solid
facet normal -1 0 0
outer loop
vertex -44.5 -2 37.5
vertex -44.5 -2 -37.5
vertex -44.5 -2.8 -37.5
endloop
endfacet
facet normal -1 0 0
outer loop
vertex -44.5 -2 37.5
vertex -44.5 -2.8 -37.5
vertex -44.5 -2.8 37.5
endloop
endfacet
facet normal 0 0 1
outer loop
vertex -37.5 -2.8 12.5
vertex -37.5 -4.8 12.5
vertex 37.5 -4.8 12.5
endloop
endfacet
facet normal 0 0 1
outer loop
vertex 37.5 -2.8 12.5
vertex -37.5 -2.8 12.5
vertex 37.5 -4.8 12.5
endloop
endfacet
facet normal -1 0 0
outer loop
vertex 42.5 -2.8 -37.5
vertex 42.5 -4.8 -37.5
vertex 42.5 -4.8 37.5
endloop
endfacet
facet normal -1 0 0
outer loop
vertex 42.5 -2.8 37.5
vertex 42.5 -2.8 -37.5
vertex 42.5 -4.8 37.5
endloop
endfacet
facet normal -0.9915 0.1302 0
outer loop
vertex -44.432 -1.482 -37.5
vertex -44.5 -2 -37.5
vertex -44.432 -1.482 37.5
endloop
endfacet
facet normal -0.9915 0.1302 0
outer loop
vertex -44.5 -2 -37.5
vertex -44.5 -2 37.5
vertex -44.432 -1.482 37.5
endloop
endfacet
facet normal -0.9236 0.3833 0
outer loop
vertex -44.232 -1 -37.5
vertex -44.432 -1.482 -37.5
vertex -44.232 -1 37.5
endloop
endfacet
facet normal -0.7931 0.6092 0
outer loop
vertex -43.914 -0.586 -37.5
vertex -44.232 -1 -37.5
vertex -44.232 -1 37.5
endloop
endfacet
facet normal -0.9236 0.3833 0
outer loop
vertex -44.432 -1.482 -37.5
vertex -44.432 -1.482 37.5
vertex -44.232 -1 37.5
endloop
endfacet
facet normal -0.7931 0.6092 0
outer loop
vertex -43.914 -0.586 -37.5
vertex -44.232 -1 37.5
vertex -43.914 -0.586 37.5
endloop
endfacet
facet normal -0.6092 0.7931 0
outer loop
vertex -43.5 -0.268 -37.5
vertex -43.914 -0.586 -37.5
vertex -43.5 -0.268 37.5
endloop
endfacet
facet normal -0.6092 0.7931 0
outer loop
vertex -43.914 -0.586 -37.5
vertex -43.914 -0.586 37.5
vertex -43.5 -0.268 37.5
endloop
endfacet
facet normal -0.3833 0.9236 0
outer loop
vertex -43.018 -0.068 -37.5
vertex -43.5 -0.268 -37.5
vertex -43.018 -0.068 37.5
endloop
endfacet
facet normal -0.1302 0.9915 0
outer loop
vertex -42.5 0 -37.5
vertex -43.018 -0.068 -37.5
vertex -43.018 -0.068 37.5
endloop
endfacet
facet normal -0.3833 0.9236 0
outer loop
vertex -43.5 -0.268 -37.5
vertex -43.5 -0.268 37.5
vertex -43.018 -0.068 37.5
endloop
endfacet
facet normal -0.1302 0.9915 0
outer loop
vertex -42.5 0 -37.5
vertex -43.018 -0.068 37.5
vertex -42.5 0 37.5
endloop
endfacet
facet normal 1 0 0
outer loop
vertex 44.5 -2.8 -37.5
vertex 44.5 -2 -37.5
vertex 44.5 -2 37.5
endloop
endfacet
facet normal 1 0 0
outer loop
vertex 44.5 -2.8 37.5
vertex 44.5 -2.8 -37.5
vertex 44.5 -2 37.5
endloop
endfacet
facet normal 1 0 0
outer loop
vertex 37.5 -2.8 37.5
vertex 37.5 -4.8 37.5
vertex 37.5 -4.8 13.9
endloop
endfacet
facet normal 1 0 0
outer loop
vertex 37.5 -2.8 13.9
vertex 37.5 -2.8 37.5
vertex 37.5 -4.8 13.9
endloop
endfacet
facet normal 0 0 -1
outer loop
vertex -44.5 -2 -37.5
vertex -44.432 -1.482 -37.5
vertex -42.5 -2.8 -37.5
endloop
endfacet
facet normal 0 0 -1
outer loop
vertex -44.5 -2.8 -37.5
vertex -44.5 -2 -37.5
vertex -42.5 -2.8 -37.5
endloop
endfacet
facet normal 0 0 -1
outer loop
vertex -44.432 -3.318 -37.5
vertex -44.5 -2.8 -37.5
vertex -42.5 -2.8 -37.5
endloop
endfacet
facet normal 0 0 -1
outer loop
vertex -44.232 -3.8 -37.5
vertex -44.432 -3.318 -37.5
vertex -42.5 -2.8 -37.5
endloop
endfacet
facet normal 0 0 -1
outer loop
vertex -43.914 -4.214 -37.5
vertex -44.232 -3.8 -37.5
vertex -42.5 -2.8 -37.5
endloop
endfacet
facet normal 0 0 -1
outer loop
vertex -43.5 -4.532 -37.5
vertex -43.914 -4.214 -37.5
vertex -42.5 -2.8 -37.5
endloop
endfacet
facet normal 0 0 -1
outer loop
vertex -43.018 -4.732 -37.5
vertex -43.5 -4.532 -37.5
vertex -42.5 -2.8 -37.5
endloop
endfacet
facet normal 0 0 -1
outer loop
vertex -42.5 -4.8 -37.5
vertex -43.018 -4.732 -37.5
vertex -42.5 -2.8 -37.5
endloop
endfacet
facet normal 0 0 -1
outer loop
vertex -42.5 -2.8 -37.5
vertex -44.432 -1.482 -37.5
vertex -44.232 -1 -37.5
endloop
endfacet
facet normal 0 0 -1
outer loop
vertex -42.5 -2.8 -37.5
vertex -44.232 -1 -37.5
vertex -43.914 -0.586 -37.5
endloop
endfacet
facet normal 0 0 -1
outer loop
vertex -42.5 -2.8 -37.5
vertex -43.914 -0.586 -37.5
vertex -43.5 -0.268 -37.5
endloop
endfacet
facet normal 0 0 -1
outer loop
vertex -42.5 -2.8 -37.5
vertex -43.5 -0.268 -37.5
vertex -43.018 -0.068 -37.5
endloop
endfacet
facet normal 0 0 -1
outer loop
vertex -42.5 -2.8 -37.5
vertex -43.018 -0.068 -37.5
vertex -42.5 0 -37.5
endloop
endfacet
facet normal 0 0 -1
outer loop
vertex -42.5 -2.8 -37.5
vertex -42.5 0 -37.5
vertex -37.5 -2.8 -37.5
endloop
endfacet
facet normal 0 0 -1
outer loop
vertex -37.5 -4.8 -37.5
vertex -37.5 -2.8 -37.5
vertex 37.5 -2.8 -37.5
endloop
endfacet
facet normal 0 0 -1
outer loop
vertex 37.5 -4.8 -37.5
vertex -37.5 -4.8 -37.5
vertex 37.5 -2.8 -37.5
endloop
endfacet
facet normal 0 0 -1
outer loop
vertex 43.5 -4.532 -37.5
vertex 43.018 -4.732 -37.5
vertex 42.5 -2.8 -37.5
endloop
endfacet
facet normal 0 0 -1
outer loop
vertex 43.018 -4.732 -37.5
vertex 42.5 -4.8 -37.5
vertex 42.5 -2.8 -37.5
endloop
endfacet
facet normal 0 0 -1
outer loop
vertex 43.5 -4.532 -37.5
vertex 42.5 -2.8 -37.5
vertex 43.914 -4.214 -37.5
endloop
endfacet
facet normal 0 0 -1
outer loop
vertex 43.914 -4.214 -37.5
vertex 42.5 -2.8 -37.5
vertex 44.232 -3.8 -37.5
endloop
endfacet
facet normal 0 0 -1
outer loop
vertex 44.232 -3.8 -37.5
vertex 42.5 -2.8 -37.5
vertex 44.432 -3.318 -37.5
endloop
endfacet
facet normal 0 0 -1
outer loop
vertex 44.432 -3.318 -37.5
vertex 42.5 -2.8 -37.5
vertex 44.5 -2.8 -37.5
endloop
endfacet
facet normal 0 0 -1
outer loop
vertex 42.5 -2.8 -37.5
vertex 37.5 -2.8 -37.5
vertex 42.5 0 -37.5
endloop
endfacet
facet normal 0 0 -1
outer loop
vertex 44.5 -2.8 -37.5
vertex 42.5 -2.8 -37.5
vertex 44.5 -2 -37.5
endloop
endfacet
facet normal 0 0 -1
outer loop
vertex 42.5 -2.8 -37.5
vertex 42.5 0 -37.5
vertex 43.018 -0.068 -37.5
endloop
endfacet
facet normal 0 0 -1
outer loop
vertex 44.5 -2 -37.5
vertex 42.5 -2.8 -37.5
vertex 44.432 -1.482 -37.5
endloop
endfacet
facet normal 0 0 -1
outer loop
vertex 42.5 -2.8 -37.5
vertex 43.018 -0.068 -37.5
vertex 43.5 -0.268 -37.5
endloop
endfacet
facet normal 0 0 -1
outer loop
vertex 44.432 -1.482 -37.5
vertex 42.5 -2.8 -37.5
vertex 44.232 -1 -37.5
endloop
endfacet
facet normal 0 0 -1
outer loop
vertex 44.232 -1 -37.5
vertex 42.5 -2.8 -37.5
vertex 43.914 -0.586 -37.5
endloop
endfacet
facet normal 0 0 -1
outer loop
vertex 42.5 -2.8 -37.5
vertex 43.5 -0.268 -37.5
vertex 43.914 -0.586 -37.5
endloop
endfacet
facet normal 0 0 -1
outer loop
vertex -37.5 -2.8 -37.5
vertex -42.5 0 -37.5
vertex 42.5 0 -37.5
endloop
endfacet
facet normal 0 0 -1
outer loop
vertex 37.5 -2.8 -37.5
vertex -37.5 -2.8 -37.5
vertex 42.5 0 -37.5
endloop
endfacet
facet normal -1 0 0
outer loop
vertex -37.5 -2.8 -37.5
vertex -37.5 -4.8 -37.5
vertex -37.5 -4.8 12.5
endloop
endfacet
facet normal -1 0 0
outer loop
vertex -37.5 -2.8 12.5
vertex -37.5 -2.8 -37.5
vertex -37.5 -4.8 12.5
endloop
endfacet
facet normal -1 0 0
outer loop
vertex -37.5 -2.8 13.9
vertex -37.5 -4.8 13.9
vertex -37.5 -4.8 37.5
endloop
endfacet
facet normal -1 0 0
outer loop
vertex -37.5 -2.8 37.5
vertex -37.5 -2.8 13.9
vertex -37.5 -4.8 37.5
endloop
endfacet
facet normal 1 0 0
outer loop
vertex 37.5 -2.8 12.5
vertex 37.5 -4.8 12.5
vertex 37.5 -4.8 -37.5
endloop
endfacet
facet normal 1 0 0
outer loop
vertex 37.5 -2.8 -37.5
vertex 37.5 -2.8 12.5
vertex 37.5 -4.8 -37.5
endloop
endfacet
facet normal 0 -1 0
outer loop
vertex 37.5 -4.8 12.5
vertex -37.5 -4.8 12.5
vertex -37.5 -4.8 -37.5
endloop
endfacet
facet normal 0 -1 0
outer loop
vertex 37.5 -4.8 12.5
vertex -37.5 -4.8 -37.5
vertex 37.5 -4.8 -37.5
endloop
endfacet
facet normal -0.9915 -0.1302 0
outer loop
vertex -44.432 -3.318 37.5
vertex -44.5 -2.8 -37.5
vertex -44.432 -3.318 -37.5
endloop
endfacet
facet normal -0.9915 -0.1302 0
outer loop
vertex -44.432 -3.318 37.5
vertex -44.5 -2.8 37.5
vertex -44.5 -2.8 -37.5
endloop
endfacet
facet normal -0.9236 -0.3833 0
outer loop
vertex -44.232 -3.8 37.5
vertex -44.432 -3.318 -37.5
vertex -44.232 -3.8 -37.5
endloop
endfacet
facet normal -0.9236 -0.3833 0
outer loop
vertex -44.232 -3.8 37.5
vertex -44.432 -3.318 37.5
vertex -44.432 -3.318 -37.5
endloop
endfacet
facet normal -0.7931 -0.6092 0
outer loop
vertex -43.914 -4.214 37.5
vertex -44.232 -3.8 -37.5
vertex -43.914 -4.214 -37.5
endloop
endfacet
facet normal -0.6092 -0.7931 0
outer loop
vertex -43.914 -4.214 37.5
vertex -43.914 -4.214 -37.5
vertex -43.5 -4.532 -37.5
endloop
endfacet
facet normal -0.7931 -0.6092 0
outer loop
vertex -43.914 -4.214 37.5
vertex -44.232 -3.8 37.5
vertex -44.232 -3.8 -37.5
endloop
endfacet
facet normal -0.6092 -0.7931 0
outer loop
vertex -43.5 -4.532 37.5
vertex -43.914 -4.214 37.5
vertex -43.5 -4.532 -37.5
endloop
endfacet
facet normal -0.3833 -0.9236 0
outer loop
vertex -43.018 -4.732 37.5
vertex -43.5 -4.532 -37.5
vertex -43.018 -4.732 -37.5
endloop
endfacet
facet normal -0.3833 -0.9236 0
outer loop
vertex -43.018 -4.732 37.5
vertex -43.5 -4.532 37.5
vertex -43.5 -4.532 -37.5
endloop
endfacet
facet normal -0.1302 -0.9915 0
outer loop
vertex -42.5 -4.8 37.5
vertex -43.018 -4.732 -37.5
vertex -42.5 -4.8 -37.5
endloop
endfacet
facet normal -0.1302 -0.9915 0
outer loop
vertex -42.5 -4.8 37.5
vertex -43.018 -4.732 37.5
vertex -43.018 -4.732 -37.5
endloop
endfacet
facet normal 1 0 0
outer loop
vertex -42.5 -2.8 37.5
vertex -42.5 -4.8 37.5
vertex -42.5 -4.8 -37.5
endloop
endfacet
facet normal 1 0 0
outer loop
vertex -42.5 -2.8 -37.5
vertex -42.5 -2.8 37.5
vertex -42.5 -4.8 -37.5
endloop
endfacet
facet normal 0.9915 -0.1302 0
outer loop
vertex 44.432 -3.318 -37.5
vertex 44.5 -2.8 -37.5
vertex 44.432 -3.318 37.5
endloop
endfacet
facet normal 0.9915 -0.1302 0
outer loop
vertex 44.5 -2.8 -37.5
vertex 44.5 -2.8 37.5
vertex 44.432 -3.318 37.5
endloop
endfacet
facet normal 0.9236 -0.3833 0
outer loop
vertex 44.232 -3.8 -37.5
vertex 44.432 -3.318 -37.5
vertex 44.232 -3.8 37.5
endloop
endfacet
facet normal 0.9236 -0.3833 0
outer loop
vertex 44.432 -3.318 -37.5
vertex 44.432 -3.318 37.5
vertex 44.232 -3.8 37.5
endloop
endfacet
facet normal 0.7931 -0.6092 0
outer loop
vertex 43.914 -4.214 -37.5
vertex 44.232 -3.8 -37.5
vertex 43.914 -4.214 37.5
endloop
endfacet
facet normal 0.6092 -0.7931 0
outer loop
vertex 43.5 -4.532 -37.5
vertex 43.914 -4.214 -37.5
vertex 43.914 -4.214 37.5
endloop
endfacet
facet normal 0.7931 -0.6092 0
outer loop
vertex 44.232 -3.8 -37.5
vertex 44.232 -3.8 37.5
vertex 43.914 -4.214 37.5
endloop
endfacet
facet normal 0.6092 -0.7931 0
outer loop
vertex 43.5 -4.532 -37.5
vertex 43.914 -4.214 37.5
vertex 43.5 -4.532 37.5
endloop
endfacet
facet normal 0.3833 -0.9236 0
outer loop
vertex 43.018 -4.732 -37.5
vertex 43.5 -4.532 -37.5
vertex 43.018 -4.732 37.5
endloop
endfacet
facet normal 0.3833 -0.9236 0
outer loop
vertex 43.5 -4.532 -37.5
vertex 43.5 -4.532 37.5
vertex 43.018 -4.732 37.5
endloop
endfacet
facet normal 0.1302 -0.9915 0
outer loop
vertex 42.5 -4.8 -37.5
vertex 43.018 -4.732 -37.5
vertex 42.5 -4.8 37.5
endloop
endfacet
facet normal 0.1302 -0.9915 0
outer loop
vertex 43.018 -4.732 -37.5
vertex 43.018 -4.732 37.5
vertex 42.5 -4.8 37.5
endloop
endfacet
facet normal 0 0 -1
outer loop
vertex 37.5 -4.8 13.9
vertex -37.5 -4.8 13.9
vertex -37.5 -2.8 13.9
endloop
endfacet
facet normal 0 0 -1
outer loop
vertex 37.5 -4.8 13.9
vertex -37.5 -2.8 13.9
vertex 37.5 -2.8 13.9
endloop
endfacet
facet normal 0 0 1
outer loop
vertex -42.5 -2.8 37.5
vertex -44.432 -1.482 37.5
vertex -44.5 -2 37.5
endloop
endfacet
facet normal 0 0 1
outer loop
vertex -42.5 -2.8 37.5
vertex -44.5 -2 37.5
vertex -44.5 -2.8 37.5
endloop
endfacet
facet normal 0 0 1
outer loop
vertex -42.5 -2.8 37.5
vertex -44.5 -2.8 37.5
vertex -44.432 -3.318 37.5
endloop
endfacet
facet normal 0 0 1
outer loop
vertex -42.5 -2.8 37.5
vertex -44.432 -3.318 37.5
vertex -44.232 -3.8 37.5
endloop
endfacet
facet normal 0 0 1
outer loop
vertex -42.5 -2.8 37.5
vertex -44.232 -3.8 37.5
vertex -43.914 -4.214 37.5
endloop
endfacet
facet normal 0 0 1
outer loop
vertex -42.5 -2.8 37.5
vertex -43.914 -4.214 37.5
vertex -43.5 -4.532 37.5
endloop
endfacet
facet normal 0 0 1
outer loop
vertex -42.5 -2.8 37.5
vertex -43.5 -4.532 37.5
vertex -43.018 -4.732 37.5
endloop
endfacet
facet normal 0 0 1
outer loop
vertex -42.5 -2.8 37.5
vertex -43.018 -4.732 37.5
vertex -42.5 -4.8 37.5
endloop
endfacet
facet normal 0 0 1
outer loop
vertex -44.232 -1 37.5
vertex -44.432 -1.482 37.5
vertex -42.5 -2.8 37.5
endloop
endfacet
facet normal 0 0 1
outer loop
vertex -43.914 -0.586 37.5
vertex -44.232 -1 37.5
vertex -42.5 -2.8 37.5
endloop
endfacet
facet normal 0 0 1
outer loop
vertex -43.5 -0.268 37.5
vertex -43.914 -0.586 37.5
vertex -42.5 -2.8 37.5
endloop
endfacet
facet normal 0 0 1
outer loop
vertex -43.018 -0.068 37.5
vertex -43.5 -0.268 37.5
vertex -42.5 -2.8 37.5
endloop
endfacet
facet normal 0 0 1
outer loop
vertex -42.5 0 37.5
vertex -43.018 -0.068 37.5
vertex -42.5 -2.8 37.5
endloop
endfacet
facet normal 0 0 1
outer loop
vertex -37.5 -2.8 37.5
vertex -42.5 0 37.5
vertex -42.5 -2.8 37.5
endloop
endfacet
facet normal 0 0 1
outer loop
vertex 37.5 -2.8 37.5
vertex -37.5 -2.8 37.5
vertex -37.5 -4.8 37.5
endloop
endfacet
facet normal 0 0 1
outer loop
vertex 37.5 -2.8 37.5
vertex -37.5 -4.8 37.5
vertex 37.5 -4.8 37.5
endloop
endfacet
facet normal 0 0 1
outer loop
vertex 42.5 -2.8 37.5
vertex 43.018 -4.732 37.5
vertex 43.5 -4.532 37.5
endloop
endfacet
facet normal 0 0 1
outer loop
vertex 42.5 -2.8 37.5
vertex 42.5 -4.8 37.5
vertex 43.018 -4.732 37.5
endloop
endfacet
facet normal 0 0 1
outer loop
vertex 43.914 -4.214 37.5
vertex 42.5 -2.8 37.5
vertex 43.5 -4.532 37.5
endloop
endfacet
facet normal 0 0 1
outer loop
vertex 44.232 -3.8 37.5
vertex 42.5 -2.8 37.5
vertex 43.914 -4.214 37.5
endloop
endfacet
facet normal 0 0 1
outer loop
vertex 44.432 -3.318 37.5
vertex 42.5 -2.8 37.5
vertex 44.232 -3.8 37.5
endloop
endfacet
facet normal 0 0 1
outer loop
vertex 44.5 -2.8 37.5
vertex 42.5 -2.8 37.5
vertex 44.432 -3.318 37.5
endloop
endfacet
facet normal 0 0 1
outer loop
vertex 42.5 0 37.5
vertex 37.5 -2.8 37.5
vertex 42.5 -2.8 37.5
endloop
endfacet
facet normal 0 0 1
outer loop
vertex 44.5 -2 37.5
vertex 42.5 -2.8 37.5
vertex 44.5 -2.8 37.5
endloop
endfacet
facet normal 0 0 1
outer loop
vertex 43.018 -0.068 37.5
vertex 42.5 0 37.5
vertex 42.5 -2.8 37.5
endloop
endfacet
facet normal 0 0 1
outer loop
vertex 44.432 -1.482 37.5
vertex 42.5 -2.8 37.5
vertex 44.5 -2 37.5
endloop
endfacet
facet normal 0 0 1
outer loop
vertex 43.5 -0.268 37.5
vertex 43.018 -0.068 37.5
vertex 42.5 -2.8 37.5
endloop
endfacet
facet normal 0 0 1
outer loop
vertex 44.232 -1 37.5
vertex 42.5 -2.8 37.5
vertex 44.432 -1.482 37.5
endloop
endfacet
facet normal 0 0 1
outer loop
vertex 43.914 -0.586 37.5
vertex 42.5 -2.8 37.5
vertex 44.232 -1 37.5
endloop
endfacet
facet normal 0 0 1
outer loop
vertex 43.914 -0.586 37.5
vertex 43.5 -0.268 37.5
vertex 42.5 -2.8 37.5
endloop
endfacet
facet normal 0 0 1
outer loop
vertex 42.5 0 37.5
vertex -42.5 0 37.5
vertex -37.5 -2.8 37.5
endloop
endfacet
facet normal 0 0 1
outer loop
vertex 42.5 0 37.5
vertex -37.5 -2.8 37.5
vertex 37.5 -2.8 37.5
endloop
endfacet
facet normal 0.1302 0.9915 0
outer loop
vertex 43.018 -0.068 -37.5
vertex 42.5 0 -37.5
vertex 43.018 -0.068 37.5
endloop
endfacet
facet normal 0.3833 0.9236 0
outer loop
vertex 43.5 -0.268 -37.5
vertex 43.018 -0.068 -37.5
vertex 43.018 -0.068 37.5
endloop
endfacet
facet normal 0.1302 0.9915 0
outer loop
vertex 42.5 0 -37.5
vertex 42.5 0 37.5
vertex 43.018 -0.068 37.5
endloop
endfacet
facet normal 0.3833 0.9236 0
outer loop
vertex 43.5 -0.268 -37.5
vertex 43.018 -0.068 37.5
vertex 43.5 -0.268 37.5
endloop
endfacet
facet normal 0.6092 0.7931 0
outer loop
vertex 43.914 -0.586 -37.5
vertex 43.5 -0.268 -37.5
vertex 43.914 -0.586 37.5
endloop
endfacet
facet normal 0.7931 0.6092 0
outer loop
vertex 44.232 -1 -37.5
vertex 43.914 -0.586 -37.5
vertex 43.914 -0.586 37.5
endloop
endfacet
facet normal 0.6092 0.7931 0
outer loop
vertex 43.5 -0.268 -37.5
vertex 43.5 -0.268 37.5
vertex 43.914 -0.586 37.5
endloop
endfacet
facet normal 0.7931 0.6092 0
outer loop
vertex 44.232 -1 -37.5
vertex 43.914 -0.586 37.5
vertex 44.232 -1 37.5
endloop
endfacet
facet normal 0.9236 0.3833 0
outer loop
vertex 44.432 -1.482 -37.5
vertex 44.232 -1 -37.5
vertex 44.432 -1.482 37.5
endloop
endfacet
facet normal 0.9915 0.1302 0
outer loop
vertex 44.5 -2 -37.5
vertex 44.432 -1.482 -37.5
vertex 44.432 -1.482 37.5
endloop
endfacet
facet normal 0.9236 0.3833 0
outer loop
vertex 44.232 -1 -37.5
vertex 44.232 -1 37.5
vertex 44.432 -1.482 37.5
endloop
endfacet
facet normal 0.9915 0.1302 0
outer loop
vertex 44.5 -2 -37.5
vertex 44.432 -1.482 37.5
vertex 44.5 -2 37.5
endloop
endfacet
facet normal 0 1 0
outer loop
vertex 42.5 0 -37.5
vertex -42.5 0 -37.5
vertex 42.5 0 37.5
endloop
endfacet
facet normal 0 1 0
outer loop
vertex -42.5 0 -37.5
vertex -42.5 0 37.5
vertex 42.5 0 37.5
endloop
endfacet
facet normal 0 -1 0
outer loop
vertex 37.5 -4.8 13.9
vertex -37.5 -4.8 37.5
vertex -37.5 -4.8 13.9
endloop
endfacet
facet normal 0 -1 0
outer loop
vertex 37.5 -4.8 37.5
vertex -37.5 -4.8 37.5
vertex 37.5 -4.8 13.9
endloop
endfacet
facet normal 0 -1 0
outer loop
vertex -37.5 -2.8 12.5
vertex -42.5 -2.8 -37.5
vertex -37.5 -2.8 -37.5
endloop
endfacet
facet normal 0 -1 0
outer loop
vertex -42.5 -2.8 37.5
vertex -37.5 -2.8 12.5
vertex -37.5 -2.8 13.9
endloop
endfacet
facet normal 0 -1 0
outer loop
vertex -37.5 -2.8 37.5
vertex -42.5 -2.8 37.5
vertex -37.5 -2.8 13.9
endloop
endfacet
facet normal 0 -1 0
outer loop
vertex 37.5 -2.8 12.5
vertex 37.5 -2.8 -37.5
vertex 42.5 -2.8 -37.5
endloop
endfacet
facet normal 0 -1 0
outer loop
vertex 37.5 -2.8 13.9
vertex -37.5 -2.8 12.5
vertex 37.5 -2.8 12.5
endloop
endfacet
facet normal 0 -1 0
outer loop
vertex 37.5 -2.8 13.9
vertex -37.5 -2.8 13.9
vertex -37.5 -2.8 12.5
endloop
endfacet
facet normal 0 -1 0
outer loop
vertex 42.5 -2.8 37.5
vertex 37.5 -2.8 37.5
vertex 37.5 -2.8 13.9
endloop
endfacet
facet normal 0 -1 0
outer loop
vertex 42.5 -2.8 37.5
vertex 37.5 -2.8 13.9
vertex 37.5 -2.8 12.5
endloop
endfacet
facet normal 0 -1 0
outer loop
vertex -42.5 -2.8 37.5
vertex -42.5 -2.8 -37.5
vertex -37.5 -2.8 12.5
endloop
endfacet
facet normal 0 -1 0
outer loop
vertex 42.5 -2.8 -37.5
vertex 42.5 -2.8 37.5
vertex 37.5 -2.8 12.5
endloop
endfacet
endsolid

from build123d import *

# Parameters (mm, degrees)
F0_W     = 89
F0_H     = 75
F1_DEPTH = 4.8
F2_W     = 75
F2_H     = 1.4
F3_DEPTH = 2
F4_R     = 1.99999


# Not quite as in the source:
# - a fillet or chamfer is up to 0.001 mm smaller than in the source, because OpenCascade refuses the exact size


with BuildPart() as f1:
    # F0 (on Front) → F1 (new body)
    with BuildSketch(Plane.XZ):
        Rectangle(F0_W, F0_H)
    extrude(amount=F1_DEPTH)

    # F2 (on face) → F3 (cut)
    with BuildSketch(Plane.XZ.offset(4.8)):
        Polygon((-42.5, 37.5), (-42.5, -37.5), (-37.5, -37.5), (-37.5, 12.5), (-37.5, 13.9), (-37.5, 37.5), align=None)
        with Locations((0, 13.2)):
            Rectangle(F2_W, F2_H)
        Polygon((37.5, 13.9), (37.5, 12.5), (37.5, -37.5), (42.5, -37.5), (42.5, 37.5), (37.5, 37.5), align=None)
    extrude(amount=-F3_DEPTH, mode=Mode.SUBTRACT)

    # F4 (radius 2 in the source; OpenCascade refuses exactly that, so slightly less here)
    f4_edges = [f1.edges().sort_by_distance(p)[0] for p in [
        (-44.5, -4.8, 0),
        (44.5, -4.8, 0),
        (44.5, 0, 0),
        (-44.5, 0, 0),
    ]]
    fillet(f4_edges, radius=F4_R)


solid = f1.part
